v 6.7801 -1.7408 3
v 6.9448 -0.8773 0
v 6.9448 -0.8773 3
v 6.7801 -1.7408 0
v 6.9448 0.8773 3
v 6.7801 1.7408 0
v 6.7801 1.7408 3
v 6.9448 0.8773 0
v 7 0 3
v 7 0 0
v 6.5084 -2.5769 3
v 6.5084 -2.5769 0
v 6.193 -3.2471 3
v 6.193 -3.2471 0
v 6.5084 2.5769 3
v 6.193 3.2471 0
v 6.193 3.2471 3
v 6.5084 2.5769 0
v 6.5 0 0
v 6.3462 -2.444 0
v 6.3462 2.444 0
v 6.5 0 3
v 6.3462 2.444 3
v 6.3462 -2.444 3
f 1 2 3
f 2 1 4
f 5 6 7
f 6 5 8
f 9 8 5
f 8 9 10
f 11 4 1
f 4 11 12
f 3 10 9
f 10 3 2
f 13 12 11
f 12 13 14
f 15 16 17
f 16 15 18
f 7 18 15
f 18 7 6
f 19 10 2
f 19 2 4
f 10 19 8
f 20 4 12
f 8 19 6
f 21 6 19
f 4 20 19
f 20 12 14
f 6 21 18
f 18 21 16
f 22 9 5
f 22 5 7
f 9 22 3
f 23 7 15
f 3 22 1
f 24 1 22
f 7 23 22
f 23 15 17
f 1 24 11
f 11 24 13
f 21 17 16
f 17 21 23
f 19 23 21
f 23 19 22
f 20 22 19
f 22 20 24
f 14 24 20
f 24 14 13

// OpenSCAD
$fn = 50;


difference() {
	union() {
		cylinder(h = 3, r = 7.0000000000);
		translate(v = [-16.0000000000, 0, 0]) {
			cylinder(h = 3, r = 7.0000000000);
		}
	}
	union() {
		cylinder(h = 3, r = 3.2500000000);
		cylinder(h = 3, r = 1.8000000000);
		cylinder(h = 3, r = 1.8000000000);
		cylinder(h = 3, r = 1.8000000000);
		translate(v = [-20.5000000000, 0, 0]) {
			hull() {
				translate(v = [-3.7500000000, 0.0000000000, 0]) {
					cylinder(h = 3, r = 10.5000000000);
				}
				translate(v = [3.7500000000, 0.0000000000, 0]) {
					cylinder(h = 3, r = 10.5000000000);
				}
				translate(v = [-3.7500000000, -0.0000000000, 0]) {
					cylinder(h = 3, r = 10.5000000000);
				}
				translate(v = [3.7500000000, -0.0000000000, 0]) {
					cylinder(h = 3, r = 10.5000000000);
				}
			}
		}
		translate(v = [-13.0000000000, 0, 0.0000000000]) {
			cylinder(h = 3, r = 19.5000000000);
		}
	}
}
